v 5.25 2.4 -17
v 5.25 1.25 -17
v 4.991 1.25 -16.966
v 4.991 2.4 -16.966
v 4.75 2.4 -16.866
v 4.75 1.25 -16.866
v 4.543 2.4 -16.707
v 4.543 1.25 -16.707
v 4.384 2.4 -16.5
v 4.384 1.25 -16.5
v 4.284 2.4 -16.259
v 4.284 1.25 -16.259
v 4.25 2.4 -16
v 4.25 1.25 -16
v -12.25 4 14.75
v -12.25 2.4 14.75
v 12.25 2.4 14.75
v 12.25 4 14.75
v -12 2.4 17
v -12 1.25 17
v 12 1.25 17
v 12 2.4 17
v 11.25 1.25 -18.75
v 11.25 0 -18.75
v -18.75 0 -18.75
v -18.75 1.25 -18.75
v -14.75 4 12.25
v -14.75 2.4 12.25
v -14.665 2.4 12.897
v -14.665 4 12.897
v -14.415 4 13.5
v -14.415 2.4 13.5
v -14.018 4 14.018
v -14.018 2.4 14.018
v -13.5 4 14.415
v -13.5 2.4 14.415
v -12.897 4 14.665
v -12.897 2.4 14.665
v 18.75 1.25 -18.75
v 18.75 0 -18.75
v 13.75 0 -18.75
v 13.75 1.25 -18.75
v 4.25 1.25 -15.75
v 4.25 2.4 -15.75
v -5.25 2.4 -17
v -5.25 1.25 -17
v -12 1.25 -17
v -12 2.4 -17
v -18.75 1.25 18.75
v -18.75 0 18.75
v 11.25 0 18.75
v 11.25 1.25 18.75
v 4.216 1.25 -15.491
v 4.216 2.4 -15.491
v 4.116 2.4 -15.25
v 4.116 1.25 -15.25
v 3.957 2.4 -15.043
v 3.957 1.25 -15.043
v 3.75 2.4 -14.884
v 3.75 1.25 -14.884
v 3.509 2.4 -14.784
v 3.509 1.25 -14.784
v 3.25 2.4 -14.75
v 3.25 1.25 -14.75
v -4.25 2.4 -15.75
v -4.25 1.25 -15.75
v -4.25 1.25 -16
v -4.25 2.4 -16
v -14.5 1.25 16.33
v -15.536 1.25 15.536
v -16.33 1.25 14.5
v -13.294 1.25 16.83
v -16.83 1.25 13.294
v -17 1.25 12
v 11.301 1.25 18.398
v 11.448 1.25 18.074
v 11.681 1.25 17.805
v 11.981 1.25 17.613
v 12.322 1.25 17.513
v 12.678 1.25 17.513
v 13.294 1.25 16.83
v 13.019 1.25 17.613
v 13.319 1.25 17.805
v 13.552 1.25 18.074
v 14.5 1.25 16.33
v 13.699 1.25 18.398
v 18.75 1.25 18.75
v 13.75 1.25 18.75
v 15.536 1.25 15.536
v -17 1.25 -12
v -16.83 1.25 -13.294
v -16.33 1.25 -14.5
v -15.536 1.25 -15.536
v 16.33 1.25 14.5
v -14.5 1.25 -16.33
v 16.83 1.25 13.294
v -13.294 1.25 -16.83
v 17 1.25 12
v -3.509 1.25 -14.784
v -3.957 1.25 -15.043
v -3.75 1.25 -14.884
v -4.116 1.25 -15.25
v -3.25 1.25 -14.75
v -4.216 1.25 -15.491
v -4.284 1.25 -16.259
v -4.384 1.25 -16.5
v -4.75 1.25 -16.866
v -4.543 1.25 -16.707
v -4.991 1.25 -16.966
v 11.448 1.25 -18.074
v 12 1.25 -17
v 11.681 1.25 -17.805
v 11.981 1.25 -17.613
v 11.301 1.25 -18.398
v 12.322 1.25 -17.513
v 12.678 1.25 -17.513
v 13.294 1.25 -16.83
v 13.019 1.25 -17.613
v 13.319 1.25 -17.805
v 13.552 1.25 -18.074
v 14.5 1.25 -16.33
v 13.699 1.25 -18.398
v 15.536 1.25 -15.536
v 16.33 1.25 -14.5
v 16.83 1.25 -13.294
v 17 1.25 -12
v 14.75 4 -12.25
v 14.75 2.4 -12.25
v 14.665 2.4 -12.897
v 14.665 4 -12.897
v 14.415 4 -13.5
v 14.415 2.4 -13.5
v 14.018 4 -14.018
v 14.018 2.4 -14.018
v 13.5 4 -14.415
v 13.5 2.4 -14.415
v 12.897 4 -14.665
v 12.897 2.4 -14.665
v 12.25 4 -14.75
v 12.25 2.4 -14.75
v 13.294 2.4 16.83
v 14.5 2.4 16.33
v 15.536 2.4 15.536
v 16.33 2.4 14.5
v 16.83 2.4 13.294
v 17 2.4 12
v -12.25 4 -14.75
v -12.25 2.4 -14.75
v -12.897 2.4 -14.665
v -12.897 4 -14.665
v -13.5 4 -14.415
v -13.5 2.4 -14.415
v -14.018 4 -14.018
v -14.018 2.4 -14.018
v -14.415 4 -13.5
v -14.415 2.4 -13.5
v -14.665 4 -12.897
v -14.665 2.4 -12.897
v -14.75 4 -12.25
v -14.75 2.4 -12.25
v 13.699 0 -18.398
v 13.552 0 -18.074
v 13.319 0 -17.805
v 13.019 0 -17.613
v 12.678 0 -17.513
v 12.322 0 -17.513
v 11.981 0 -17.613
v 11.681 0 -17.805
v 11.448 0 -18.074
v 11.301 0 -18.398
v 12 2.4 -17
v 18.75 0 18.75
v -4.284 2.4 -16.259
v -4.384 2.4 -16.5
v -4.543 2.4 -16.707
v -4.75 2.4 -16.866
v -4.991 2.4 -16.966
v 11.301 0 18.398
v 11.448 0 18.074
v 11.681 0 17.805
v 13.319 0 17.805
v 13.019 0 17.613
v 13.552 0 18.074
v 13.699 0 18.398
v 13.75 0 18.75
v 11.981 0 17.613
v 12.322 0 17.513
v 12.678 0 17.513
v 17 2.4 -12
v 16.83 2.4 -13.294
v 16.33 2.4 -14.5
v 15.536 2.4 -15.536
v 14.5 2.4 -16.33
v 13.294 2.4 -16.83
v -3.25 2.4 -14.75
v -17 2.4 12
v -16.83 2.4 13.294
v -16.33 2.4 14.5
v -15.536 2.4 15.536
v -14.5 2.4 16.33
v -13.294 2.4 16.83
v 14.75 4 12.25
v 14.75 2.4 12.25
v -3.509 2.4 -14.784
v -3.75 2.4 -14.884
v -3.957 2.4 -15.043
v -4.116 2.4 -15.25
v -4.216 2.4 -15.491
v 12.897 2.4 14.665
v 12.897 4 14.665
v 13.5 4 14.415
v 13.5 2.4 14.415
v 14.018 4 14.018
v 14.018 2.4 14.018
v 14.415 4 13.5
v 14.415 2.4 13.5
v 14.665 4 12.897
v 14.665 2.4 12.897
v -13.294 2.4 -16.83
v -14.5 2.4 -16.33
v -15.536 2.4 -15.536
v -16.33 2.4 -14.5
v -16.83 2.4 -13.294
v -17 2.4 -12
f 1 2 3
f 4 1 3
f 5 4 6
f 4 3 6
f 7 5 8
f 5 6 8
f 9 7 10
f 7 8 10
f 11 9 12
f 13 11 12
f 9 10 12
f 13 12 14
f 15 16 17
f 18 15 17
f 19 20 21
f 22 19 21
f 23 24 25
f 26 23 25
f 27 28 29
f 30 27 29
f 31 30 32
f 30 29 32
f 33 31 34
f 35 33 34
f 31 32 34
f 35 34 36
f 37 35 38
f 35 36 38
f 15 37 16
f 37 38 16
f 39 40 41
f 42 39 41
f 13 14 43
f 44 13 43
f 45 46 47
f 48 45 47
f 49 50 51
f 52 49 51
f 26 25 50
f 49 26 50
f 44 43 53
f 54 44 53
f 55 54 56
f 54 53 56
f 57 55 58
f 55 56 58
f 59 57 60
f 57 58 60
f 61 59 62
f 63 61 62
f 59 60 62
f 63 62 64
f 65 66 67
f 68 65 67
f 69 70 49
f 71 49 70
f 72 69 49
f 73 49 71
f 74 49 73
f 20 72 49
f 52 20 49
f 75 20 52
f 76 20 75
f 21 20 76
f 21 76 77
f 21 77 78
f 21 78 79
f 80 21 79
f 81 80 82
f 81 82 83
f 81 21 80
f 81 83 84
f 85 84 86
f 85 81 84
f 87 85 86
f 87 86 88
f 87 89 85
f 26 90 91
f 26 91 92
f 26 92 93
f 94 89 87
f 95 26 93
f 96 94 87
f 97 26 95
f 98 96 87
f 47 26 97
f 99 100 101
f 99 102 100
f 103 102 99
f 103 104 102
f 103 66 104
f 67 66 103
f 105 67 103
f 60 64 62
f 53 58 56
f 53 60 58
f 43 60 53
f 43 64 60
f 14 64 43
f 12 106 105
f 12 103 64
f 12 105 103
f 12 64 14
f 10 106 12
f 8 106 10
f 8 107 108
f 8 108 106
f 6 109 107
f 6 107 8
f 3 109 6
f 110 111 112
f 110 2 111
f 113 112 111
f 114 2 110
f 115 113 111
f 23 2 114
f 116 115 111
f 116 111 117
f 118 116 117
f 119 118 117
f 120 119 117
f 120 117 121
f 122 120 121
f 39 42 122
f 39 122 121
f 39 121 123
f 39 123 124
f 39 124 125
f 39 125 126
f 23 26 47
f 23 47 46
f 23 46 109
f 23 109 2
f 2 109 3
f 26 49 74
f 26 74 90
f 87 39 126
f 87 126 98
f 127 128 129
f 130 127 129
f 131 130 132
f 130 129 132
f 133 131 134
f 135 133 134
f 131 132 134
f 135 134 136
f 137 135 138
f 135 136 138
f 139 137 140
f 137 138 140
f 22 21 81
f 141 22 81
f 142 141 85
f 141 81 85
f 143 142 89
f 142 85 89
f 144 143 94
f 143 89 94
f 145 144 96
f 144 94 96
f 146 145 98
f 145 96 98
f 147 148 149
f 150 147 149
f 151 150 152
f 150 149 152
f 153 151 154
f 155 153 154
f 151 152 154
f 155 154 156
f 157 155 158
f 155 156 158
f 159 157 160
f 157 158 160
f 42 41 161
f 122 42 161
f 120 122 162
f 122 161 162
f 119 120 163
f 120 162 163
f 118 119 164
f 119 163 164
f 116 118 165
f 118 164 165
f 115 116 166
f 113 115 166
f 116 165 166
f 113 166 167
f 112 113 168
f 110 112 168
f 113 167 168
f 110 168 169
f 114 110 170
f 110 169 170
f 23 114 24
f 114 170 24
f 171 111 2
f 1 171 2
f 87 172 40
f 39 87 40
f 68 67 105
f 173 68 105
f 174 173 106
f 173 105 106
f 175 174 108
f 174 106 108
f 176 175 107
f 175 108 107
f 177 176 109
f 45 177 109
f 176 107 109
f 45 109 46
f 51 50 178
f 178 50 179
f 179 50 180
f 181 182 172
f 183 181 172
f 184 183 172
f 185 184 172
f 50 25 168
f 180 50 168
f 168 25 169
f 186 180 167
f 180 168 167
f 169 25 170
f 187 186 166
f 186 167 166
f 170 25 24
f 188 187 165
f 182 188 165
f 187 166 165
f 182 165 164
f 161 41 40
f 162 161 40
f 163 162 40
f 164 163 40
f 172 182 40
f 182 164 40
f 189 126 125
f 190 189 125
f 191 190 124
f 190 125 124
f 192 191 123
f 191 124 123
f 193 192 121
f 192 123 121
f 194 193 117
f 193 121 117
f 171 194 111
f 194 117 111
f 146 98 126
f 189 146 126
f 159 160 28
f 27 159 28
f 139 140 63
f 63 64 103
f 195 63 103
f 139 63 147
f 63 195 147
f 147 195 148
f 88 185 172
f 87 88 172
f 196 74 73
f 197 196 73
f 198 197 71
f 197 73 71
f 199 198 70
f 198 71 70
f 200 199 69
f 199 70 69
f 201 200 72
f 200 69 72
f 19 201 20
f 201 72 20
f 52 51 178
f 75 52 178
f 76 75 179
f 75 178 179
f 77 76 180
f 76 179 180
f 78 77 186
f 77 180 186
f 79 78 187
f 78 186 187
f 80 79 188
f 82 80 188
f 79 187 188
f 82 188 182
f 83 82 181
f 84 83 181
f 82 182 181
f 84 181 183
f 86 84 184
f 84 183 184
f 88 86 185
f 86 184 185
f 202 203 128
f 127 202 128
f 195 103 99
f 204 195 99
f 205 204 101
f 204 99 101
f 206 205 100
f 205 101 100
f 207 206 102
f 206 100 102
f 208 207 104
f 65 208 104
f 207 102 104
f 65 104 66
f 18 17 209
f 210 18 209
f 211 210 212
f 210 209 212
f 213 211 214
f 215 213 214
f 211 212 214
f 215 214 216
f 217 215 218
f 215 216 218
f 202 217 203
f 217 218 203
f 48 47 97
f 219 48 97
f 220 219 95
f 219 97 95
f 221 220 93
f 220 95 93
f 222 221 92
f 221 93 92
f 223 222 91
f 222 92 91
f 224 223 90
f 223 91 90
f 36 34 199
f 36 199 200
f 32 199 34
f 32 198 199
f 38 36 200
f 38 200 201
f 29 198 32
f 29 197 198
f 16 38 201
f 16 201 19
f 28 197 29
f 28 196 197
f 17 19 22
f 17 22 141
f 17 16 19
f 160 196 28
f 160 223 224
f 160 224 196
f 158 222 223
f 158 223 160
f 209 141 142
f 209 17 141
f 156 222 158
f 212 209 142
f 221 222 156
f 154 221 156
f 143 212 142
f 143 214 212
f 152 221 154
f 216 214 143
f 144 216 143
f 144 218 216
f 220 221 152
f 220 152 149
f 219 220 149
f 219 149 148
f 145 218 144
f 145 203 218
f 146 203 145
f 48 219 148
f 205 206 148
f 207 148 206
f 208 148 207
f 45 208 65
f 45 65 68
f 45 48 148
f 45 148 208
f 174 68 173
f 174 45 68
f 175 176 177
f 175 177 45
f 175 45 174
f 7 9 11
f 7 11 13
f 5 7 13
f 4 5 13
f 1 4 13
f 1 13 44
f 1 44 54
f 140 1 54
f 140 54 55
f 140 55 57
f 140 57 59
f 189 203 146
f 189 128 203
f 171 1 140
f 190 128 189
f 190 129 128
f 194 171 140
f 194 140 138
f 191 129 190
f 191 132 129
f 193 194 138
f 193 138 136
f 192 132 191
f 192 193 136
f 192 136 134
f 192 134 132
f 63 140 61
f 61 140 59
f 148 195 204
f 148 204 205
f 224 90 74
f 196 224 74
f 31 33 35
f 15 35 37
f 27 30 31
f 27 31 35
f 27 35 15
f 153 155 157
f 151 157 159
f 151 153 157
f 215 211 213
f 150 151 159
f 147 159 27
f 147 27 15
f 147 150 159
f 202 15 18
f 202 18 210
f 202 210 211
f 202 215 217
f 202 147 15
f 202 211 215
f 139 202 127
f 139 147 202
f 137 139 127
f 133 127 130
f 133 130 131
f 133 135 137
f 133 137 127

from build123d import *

# Parameters (mm, degrees)
BOSS_EXTRUDE1_DEPTH = 1.25
BOSS_EXTRUDE2_DEPTH = 2.4
BOSS_EXTRUDE3_DEPTH = 4


with BuildPart() as part:
    # Sketch1 → Boss-Extrude1 (new body)
    with BuildSketch(Plane(origin=(0, 0, 0), x_dir=(1, 0, 0), z_dir=(0, 1, 0))):
        with BuildLine():
            Line((18.75, 18.75), (13.75, 18.75))
            ThreePointArc((13.75, 18.75), (12.5, 17.5), (11.25, 18.75))
            Line((11.25, 18.75), (-18.75, 18.75))
            Line((-18.75, 18.75), (-18.75, -18.75))
            Line((-18.75, -18.75), (11.25, -18.75))
            ThreePointArc((11.25, -18.75), (12.5, -17.5), (13.75, -18.75))
            Line((13.75, -18.75), (18.75, -18.75))
            Line((18.75, -18.75), (18.75, 18.75))
        make_face()
    extrude(amount=BOSS_EXTRUDE1_DEPTH)

    # Sketch1<3> → Boss-Extrude2 (add)
    with BuildSketch(Plane(origin=(0, 0, 0), x_dir=(1, 0, 0), z_dir=(0, 1, 0))):
        with BuildLine():
            Line((-4.25, 15.75), (-4.25, 16))
            ThreePointArc((-4.25, 16), (-4.542893219, 16.707106781), (-5.25, 17))
            Line((-5.25, 17), (-12, 17))
            ThreePointArc((-12, 17), (-15.535533906, 15.535533906), (-17, 12))
            Line((-17, 12), (-17, -12))
            ThreePointArc((-17, -12), (-15.535533906, -15.535533906), (-12, -17))
            Line((-12, -17), (12, -17))
            ThreePointArc((12, -17), (15.535533906, -15.535533906), (17, -12))
            Line((17, -12), (17, 12))
            ThreePointArc((17, 12), (15.535533906, 15.535533906), (12, 17))
            Line((12, 17), (5.25, 17))
            ThreePointArc((5.25, 17), (4.542893219, 16.707106781), (4.25, 16))
            Line((4.25, 16), (4.25, 15.75))
            ThreePointArc((4.25, 15.75), (3.957106781, 15.042893219), (3.25, 14.75))
            Line((3.25, 14.75), (-3.25, 14.75))
            ThreePointArc((-3.25, 14.75), (-3.957106781, 15.042893219), (-4.25, 15.75))
        make_face()
    extrude(amount=BOSS_EXTRUDE2_DEPTH)

    # Sketch1<4> → Boss-Extrude3 (add)
    with BuildSketch(Plane(origin=(0, 0, 0), x_dir=(1, 0, 0), z_dir=(0, 1, 0))):
        with BuildLine():
            Line((3.25, 14.75), (-3.25, 14.75))
            Line((-3.25, 14.75), (-12.25, 14.75))
            ThreePointArc((-12.25, 14.75), (-14.017766953, 14.017766953), (-14.75, 12.25))
            Line((-14.75, 12.25), (-14.75, -12.25))
            ThreePointArc((-14.75, -12.25), (-14.017766953, -14.017766953), (-12.25, -14.75))
            Line((-12.25, -14.75), (12.25, -14.75))
            ThreePointArc((12.25, -14.75), (14.017766953, -14.017766953), (14.75, -12.25))
            Line((14.75, -12.25), (14.75, 12.25))
            ThreePointArc((14.75, 12.25), (14.017766953, 14.017766953), (12.25, 14.75))
            Line((12.25, 14.75), (3.25, 14.75))
        make_face()
    extrude(amount=BOSS_EXTRUDE3_DEPTH)


solid = part.part
